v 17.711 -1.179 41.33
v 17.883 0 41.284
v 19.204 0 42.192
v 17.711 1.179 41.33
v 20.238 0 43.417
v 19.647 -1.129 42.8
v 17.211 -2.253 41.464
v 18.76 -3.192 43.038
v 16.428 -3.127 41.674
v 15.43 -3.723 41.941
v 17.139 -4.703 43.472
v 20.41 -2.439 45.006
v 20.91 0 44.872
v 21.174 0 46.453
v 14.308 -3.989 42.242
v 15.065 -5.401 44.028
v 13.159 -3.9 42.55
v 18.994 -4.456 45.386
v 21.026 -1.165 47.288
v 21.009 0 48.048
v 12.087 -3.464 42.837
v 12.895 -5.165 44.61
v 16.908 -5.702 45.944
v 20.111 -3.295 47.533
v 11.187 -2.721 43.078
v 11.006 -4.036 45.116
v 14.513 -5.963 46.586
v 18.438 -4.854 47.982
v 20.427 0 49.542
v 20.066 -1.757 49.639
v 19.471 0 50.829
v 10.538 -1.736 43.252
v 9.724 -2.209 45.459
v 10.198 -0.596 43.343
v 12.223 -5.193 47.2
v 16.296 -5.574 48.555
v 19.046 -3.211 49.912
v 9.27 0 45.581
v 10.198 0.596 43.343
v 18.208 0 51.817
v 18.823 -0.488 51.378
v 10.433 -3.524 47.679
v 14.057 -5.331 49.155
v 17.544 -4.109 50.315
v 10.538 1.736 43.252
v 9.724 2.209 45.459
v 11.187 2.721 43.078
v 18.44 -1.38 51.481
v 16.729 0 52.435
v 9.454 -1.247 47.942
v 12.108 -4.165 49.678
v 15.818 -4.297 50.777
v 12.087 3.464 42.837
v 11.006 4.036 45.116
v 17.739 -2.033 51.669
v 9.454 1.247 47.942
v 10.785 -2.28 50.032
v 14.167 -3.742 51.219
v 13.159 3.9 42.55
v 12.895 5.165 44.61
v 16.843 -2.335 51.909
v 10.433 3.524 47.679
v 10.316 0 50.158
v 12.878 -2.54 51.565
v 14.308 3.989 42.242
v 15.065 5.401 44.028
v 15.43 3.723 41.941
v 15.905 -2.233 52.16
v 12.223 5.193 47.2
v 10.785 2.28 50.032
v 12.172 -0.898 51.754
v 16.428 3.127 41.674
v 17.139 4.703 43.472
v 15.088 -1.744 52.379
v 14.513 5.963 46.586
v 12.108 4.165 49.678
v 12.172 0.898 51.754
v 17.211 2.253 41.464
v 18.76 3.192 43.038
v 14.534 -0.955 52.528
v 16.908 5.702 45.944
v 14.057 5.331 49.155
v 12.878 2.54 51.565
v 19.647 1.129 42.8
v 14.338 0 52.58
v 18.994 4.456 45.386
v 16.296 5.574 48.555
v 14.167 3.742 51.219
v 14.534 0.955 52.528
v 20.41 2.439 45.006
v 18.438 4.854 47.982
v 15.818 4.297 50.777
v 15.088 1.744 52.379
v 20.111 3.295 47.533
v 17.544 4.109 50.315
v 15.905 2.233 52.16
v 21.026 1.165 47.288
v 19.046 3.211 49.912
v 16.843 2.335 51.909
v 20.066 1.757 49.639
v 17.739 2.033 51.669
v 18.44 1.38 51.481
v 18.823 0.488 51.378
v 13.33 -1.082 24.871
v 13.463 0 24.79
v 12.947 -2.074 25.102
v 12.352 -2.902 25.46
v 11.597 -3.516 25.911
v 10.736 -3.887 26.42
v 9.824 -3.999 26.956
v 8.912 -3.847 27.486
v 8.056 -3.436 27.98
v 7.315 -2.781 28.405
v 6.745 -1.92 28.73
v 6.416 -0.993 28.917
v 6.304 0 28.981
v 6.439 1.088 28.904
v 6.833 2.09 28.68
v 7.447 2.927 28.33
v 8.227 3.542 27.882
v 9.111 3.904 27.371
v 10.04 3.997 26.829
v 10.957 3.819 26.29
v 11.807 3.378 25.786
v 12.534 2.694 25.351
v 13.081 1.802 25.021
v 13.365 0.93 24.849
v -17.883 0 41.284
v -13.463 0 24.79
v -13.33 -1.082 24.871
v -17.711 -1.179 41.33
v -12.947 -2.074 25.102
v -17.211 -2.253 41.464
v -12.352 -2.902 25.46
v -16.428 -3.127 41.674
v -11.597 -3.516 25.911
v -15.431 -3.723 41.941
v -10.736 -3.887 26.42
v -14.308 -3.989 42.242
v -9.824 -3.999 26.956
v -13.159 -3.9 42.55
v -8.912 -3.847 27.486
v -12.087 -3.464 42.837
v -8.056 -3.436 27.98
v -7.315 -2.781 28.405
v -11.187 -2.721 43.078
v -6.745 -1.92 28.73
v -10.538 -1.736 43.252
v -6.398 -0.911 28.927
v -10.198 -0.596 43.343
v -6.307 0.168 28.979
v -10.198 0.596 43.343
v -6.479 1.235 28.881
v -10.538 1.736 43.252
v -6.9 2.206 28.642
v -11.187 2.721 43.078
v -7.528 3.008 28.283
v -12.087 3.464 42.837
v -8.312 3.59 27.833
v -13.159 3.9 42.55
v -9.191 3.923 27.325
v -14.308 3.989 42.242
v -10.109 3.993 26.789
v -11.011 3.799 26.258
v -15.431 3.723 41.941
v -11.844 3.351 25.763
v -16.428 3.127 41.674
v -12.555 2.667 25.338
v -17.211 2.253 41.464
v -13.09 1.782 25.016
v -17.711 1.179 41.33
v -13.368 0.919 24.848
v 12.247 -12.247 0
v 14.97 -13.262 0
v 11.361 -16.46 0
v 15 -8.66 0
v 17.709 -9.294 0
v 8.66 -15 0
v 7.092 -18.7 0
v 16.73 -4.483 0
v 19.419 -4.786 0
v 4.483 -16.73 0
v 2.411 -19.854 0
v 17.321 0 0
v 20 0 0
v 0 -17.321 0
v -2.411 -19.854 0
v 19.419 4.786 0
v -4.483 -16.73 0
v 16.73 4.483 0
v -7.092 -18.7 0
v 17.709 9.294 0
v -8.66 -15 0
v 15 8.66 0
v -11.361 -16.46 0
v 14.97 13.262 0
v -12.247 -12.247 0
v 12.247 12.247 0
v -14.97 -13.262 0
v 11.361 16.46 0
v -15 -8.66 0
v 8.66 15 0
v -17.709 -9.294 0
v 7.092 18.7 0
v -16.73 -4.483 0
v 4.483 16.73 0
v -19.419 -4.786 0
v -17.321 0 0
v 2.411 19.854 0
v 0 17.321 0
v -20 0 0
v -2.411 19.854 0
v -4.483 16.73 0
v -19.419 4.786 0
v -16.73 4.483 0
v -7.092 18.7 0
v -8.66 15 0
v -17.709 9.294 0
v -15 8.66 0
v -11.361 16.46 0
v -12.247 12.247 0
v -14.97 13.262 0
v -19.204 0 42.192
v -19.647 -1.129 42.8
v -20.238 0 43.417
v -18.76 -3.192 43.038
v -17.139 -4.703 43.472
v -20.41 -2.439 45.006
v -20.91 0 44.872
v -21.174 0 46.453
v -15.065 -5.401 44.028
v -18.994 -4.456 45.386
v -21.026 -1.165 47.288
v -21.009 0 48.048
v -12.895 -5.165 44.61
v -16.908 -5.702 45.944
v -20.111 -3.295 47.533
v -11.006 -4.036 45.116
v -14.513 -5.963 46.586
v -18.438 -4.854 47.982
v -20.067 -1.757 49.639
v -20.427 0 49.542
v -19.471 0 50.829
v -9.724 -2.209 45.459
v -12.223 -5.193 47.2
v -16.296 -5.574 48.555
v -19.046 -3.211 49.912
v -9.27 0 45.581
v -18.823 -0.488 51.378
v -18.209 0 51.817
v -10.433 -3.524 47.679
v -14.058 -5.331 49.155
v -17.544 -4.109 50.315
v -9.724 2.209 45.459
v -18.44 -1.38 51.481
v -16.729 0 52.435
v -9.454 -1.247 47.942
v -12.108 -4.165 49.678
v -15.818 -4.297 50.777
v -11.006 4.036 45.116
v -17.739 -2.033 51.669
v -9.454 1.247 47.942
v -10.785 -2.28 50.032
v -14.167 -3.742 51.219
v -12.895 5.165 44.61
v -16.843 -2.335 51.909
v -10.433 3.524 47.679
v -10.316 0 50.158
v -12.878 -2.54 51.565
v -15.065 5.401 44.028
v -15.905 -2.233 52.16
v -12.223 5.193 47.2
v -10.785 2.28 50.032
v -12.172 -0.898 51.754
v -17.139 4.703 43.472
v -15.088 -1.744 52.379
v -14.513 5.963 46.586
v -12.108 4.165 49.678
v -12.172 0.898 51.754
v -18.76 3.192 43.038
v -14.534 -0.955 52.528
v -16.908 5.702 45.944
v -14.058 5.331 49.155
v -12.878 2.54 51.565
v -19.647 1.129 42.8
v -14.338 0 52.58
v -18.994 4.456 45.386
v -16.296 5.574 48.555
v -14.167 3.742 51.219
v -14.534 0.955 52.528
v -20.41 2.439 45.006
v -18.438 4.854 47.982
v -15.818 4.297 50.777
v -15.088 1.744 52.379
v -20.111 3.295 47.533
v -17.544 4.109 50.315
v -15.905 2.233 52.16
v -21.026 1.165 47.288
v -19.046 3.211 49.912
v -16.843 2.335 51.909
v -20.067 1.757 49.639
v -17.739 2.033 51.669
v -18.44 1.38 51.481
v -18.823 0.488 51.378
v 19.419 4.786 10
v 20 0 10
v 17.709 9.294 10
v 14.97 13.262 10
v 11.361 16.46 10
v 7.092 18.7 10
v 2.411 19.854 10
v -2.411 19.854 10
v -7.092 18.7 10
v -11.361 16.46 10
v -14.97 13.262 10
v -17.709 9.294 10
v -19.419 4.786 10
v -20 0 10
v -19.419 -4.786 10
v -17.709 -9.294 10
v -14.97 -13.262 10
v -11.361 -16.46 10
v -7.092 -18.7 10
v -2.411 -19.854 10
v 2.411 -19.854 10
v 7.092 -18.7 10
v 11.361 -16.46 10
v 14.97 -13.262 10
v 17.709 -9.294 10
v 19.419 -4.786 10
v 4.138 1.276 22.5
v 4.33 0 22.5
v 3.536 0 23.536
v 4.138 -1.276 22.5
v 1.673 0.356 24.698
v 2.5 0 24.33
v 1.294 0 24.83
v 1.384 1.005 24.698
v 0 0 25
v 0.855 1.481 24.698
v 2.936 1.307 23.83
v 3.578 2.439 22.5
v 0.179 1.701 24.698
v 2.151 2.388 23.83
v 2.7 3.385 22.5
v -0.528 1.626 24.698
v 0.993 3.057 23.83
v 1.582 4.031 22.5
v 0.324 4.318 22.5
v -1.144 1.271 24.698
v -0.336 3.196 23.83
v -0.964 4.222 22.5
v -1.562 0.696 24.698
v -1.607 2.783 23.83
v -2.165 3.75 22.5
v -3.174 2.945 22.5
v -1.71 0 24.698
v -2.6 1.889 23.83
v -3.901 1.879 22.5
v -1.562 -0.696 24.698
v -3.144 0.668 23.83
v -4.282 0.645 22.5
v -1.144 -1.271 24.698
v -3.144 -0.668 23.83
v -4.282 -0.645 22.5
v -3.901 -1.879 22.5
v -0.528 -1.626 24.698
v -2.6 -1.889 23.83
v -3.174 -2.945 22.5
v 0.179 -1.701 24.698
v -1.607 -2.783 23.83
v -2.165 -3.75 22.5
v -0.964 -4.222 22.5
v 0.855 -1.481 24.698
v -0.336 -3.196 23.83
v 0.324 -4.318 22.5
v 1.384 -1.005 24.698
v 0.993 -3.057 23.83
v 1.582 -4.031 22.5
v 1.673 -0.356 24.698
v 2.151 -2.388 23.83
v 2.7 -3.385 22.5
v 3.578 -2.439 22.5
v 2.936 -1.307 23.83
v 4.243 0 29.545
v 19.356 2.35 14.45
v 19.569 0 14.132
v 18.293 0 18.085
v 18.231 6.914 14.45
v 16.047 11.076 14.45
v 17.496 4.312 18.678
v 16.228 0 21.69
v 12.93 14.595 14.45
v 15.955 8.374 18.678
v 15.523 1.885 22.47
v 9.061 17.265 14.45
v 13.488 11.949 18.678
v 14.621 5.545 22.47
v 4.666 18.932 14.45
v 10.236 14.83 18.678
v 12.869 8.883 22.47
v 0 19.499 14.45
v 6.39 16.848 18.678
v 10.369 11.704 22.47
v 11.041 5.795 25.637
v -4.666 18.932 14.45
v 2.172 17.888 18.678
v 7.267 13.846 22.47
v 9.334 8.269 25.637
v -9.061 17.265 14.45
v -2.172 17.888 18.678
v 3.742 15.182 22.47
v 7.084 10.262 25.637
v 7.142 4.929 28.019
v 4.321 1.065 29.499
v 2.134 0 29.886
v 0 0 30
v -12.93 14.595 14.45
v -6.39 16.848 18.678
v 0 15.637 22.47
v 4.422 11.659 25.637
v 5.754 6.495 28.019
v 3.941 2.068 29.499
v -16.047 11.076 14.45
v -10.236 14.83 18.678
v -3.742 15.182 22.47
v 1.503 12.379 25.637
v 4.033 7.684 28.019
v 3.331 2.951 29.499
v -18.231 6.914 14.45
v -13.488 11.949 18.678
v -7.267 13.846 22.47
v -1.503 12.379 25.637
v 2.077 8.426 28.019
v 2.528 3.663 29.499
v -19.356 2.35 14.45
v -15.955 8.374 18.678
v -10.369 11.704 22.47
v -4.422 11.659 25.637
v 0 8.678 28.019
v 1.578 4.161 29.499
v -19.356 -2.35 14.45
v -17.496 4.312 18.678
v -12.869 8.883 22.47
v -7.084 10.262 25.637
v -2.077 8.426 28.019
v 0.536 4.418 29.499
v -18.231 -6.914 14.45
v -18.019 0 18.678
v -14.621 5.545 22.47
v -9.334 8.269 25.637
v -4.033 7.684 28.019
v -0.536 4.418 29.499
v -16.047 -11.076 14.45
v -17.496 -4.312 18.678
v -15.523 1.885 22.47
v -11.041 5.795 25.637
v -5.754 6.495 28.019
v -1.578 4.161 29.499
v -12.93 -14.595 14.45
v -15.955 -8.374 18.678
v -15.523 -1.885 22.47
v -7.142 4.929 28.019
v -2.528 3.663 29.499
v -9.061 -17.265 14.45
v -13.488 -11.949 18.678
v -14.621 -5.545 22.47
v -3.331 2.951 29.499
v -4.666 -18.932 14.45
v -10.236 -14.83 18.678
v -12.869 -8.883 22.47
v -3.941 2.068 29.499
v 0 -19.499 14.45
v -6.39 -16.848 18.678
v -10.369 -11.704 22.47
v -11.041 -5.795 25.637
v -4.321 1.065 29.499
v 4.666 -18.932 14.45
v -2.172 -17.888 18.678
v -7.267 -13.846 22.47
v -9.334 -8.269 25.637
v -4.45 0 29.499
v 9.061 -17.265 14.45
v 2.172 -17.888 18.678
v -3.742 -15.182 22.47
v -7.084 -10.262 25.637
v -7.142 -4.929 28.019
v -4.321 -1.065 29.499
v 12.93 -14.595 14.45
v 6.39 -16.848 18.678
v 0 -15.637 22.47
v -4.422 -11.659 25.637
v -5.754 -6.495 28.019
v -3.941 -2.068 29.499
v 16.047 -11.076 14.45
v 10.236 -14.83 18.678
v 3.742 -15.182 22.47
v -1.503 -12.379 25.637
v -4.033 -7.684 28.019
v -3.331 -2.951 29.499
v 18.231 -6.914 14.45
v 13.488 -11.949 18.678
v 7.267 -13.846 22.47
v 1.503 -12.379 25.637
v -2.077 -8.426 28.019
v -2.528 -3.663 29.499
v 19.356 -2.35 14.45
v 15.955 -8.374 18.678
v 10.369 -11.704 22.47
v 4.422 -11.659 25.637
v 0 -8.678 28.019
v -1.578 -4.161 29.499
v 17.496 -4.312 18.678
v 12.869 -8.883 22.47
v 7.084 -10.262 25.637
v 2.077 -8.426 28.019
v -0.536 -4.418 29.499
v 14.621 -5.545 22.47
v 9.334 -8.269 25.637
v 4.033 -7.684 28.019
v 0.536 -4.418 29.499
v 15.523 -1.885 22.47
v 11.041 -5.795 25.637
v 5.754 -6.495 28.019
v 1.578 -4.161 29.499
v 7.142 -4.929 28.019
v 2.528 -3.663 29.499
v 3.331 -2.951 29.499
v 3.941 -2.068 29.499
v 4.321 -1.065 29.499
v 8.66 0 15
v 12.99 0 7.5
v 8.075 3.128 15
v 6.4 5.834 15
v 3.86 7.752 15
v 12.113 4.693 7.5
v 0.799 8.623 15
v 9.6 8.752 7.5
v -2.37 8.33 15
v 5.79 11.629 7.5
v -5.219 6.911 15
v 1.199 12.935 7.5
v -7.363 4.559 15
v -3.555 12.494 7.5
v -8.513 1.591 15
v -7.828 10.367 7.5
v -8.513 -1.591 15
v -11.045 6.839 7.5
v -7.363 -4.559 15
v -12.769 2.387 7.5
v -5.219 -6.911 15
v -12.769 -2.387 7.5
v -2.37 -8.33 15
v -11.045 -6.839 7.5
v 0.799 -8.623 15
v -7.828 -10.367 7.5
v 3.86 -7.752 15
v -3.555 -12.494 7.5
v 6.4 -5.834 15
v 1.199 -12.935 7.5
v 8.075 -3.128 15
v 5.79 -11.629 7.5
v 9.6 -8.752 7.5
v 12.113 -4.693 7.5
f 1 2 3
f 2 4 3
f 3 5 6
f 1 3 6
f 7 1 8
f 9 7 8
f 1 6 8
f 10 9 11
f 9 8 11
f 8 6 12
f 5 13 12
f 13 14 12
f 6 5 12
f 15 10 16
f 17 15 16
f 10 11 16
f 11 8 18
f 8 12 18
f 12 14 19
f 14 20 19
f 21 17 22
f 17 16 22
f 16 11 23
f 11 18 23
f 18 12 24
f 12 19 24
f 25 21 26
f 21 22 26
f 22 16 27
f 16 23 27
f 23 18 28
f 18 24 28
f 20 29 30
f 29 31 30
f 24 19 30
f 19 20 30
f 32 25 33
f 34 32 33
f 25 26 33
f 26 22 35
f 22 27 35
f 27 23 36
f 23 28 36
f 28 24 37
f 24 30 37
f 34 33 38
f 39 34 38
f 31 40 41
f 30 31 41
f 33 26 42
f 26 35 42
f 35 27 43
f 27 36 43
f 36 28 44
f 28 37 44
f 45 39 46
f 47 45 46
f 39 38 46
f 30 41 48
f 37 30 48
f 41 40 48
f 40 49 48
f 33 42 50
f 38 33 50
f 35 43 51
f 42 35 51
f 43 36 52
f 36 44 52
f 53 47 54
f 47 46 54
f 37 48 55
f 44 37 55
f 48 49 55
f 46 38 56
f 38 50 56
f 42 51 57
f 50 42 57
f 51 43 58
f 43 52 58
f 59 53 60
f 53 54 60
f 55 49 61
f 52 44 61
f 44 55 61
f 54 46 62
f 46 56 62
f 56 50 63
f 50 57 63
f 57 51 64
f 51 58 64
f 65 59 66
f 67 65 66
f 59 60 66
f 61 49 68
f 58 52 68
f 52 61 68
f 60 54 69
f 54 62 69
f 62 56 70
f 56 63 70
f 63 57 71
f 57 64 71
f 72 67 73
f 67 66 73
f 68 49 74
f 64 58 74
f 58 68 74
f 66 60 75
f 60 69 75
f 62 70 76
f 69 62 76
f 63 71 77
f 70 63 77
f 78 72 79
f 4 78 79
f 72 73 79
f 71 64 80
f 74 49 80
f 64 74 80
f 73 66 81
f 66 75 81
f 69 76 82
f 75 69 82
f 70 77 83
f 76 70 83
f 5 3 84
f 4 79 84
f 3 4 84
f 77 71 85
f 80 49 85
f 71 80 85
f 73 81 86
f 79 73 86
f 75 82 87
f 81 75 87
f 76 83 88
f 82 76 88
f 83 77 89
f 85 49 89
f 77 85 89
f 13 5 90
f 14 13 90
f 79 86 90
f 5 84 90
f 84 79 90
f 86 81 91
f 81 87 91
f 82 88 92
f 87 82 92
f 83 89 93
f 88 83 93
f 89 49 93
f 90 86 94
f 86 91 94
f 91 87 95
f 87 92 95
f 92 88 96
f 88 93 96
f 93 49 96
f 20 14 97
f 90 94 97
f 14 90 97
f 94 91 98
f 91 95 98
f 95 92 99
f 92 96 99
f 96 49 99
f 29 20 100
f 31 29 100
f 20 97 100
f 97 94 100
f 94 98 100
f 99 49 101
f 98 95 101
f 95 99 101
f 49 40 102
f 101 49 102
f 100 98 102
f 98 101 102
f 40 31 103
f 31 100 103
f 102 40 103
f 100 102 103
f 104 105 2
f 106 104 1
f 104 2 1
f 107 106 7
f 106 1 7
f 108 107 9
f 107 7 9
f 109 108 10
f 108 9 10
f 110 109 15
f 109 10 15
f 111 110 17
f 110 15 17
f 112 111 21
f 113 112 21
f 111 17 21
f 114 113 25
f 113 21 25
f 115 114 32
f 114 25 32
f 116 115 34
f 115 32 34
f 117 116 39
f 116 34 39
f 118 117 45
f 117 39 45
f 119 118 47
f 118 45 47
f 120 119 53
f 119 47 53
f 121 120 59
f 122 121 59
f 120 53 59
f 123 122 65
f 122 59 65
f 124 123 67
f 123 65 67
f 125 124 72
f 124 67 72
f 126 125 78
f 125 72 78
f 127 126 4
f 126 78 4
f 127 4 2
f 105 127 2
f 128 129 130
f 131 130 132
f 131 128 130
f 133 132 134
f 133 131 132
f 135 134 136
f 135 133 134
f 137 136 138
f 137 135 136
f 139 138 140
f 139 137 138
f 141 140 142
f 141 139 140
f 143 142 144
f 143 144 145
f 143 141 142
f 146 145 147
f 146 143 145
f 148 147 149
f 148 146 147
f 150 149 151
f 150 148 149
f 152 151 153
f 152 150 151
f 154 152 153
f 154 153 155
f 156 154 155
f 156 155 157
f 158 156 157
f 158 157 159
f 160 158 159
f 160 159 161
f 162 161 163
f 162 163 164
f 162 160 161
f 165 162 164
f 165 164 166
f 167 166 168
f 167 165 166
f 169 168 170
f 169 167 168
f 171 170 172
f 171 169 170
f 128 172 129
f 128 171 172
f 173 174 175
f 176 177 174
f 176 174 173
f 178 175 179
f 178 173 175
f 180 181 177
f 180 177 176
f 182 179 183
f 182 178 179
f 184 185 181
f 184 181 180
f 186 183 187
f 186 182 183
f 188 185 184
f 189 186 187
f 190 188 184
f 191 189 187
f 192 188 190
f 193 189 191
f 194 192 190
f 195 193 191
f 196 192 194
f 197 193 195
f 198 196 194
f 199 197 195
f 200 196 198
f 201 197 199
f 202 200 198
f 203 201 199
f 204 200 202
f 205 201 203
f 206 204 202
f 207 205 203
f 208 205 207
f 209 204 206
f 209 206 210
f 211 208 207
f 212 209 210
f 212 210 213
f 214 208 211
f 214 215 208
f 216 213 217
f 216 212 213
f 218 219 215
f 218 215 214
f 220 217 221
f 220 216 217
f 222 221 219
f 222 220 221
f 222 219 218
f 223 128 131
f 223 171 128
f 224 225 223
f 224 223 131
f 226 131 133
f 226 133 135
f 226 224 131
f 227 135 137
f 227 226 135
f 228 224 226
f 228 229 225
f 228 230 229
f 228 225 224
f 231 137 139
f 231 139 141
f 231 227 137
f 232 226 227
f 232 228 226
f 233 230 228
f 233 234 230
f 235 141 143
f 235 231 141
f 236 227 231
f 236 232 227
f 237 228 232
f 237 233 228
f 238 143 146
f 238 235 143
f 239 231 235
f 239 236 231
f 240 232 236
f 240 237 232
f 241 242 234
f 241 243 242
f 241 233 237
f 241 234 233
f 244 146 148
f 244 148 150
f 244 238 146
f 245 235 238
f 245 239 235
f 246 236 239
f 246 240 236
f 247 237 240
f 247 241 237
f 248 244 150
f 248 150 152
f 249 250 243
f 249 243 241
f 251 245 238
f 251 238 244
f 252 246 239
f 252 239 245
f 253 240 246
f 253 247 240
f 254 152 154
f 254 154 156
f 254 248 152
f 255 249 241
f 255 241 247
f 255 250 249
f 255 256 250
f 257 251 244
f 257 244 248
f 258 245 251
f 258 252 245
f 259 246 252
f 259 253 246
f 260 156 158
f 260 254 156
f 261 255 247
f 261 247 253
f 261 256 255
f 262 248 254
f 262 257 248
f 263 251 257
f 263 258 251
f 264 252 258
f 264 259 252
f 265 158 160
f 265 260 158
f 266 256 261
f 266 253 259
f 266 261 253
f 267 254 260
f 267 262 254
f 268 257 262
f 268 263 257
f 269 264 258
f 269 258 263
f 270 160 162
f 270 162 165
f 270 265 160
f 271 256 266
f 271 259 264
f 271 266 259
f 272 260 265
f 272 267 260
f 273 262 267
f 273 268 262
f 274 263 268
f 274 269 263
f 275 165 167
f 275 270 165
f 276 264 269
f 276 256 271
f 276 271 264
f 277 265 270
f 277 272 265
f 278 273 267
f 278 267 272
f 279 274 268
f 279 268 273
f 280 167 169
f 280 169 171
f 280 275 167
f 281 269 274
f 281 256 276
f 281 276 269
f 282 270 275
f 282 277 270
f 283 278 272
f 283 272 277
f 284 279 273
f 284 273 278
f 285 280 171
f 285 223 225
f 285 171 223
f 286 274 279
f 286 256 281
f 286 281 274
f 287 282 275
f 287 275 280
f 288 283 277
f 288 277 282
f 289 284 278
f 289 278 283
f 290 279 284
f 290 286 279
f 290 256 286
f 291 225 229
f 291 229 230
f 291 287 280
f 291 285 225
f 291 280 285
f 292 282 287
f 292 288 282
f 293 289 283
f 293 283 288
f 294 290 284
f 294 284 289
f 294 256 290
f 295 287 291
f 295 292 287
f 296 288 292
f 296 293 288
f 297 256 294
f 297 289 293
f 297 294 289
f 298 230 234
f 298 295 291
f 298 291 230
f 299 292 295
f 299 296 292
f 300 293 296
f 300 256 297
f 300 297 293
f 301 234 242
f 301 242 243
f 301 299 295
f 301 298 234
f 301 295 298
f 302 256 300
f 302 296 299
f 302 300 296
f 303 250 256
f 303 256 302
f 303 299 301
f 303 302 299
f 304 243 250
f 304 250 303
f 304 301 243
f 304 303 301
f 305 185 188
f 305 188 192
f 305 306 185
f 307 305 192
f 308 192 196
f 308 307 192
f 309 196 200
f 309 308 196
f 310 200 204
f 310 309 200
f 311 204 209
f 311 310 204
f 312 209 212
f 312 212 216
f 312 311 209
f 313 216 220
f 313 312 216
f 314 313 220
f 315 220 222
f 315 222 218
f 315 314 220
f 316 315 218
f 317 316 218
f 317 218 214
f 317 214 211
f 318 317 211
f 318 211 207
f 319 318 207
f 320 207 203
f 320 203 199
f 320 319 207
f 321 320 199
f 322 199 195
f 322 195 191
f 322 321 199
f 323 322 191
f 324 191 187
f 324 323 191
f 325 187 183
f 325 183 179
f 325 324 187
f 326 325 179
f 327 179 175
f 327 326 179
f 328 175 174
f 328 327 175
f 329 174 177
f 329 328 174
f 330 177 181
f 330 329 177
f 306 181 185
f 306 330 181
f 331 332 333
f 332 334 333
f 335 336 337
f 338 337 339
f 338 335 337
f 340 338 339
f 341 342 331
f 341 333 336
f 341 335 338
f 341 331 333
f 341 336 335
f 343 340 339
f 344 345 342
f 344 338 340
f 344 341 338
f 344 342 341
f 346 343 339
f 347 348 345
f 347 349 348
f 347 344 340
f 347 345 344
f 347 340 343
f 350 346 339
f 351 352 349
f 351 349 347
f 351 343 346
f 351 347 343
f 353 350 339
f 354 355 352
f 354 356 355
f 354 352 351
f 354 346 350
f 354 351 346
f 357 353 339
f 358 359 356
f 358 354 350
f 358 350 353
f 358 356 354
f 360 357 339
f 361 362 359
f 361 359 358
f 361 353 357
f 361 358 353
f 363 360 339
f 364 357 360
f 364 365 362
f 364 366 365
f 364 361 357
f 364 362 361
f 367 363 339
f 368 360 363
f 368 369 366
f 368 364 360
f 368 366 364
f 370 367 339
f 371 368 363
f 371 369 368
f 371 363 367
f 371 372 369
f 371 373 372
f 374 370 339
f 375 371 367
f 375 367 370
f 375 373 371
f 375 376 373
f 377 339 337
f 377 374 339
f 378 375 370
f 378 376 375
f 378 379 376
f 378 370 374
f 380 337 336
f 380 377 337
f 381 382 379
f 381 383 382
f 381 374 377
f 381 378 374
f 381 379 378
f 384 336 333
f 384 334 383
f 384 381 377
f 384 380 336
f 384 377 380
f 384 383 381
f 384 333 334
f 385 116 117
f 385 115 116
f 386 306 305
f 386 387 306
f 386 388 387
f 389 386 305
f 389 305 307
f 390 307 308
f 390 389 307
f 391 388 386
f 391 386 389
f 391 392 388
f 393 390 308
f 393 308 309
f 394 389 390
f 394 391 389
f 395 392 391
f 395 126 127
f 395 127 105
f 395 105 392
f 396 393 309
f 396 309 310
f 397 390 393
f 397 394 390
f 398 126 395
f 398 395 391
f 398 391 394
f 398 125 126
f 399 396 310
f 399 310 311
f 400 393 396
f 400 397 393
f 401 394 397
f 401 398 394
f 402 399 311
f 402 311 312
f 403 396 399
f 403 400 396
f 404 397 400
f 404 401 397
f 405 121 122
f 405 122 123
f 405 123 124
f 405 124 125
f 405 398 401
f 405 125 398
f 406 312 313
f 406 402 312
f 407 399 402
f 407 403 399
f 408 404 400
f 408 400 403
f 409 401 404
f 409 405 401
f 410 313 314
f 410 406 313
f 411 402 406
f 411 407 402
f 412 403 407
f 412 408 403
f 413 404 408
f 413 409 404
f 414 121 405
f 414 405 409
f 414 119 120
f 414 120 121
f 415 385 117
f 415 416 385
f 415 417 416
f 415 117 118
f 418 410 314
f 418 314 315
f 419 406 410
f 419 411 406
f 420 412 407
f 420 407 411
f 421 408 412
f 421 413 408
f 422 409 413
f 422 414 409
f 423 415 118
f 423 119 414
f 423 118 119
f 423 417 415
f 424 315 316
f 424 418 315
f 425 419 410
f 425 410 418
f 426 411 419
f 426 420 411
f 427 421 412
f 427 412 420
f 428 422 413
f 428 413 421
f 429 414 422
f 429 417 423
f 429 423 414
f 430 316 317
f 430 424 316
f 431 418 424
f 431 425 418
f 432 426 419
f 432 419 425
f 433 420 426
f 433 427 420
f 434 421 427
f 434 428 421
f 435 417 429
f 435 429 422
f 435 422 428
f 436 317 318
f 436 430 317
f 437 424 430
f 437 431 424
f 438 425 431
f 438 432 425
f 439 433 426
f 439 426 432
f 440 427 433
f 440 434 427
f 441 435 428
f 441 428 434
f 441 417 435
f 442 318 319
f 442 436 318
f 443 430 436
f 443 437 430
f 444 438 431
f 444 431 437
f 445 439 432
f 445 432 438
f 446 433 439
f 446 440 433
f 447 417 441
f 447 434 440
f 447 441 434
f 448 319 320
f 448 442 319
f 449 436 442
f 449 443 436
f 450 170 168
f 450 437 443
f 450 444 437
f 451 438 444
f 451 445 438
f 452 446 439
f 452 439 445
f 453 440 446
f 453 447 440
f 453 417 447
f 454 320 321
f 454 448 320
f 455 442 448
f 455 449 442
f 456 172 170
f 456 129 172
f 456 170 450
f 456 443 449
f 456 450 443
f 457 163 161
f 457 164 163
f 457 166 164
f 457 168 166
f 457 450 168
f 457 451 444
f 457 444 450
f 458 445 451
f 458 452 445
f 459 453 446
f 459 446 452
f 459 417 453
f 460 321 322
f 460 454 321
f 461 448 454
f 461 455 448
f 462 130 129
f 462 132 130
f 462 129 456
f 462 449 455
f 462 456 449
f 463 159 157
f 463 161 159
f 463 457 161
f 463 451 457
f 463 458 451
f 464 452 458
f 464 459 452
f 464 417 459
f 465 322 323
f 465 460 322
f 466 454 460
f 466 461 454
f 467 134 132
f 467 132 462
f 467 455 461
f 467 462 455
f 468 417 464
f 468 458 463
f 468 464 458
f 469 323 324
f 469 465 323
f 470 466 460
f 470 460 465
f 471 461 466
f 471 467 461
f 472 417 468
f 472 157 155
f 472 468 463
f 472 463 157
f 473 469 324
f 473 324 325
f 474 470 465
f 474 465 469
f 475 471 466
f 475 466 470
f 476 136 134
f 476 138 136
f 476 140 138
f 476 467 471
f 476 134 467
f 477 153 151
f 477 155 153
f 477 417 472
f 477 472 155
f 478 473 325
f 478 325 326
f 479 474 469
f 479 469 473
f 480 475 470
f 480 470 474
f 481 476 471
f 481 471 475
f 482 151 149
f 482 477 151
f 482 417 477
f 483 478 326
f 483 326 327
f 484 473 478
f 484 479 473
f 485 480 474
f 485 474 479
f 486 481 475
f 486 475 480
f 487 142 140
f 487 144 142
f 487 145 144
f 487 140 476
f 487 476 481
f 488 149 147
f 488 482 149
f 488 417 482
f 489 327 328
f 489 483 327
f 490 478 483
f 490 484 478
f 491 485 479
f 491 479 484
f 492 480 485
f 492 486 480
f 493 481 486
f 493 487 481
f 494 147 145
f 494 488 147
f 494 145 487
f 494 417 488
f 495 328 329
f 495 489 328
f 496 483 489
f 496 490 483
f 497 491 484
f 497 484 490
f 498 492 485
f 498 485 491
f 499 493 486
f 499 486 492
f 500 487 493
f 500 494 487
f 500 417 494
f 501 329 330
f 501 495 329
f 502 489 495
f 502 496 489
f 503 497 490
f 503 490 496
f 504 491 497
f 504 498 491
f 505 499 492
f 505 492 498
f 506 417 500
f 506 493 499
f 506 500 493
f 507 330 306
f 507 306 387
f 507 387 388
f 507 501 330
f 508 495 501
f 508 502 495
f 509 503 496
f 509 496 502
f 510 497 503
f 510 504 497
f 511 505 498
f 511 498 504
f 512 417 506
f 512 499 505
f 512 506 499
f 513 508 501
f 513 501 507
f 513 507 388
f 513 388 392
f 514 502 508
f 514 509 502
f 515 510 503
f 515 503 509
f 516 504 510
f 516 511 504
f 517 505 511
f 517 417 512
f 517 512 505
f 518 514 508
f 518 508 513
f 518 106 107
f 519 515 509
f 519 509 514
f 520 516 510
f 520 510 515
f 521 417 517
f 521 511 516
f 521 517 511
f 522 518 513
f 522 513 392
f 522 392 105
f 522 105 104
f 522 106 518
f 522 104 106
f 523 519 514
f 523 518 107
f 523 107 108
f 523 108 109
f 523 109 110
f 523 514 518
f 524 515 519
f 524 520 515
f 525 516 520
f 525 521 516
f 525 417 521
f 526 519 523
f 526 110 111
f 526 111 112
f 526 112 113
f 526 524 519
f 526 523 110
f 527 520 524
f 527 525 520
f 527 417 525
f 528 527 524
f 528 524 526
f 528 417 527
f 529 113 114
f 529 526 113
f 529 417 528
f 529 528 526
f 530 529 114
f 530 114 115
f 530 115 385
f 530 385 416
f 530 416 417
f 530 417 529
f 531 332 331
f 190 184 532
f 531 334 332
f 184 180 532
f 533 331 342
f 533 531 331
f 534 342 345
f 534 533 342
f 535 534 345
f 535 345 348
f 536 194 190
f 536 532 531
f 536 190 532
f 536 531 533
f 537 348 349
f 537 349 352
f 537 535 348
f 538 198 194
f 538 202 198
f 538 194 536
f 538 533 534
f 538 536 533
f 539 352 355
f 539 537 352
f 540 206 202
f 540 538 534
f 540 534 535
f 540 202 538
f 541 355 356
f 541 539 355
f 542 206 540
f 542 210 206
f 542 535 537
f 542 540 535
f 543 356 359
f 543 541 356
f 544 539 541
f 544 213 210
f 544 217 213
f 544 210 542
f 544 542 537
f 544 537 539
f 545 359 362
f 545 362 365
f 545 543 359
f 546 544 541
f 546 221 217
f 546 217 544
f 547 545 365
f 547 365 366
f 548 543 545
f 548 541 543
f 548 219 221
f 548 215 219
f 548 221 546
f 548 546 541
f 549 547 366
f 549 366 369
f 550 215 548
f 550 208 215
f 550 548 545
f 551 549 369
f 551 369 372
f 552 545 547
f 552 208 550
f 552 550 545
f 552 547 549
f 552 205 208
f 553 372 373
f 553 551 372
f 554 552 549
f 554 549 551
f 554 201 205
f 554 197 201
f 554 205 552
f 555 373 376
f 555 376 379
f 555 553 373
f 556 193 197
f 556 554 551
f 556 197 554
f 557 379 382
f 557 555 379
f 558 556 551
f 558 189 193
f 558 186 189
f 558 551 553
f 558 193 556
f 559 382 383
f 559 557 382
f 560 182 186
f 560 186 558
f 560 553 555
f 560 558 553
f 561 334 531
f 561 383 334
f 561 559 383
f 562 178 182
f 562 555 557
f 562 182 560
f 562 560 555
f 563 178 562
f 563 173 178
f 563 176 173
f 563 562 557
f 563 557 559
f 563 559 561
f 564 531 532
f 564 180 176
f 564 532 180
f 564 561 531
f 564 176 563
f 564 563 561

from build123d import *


# Not quite as in the source:
# - a pattern or mirror of a feature is missing from the dataset's text; its kind, count and spacing are read off the source's solid


with BuildPart() as f1:
    # F0 (on Front) → F1 (revolve)
    with BuildSketch(Plane.XZ):
        with BuildLine():
            ThreePointArc((0, 25), (2.5, 24.3301270189), (4.3301270189, 22.5))
            Line((4.3301270189, 22.5), (17.3205080757, 0))
            Line((17.3205080757, 0), (20, 0))
            Line((20, 0), (20, 10))
            ThreePointArc((20, 10), (14.1421356237, 24.1421356237), (0, 30))
            Line((0, 30), (0, 25))
        make_face()
    revolve(axis=Axis((0, 0, 15), (0, 0, 1)))

    # F2 (on Front) → F3 (revolve)
    with BuildSketch(Plane.XZ):
        with BuildLine():
            Line((15.1763809021, 46.6390246015), (9.3060056246, 24.7304858066))
            Line((9.3060056246, 24.7304858066), (13.1697089298, 23.6952096262))
            Line((13.1697089298, 23.6952096262), (17.8826102498, 41.2839968035))
            ThreePointArc((17.8826102498, 41.2839968035), (21.1445422637, 47.2563170454), (16.7292951727, 52.4345795592))
            Line((16.7292951727, 52.4345795592), (15.1763809021, 46.6390246015))
        make_face()
    f3 = revolve(axis=Axis((12.2411932633, 0, 35.684755204), (-0.2588190451, 0, -0.9659258263)))

    # F3_copies: F3 across plane
    add(f3.mirror(Plane(origin=(-2.2e-05, 0, 0), x_dir=(0, 0, -1), z_dir=(-1, 0, 0))))


solid = f1.part
